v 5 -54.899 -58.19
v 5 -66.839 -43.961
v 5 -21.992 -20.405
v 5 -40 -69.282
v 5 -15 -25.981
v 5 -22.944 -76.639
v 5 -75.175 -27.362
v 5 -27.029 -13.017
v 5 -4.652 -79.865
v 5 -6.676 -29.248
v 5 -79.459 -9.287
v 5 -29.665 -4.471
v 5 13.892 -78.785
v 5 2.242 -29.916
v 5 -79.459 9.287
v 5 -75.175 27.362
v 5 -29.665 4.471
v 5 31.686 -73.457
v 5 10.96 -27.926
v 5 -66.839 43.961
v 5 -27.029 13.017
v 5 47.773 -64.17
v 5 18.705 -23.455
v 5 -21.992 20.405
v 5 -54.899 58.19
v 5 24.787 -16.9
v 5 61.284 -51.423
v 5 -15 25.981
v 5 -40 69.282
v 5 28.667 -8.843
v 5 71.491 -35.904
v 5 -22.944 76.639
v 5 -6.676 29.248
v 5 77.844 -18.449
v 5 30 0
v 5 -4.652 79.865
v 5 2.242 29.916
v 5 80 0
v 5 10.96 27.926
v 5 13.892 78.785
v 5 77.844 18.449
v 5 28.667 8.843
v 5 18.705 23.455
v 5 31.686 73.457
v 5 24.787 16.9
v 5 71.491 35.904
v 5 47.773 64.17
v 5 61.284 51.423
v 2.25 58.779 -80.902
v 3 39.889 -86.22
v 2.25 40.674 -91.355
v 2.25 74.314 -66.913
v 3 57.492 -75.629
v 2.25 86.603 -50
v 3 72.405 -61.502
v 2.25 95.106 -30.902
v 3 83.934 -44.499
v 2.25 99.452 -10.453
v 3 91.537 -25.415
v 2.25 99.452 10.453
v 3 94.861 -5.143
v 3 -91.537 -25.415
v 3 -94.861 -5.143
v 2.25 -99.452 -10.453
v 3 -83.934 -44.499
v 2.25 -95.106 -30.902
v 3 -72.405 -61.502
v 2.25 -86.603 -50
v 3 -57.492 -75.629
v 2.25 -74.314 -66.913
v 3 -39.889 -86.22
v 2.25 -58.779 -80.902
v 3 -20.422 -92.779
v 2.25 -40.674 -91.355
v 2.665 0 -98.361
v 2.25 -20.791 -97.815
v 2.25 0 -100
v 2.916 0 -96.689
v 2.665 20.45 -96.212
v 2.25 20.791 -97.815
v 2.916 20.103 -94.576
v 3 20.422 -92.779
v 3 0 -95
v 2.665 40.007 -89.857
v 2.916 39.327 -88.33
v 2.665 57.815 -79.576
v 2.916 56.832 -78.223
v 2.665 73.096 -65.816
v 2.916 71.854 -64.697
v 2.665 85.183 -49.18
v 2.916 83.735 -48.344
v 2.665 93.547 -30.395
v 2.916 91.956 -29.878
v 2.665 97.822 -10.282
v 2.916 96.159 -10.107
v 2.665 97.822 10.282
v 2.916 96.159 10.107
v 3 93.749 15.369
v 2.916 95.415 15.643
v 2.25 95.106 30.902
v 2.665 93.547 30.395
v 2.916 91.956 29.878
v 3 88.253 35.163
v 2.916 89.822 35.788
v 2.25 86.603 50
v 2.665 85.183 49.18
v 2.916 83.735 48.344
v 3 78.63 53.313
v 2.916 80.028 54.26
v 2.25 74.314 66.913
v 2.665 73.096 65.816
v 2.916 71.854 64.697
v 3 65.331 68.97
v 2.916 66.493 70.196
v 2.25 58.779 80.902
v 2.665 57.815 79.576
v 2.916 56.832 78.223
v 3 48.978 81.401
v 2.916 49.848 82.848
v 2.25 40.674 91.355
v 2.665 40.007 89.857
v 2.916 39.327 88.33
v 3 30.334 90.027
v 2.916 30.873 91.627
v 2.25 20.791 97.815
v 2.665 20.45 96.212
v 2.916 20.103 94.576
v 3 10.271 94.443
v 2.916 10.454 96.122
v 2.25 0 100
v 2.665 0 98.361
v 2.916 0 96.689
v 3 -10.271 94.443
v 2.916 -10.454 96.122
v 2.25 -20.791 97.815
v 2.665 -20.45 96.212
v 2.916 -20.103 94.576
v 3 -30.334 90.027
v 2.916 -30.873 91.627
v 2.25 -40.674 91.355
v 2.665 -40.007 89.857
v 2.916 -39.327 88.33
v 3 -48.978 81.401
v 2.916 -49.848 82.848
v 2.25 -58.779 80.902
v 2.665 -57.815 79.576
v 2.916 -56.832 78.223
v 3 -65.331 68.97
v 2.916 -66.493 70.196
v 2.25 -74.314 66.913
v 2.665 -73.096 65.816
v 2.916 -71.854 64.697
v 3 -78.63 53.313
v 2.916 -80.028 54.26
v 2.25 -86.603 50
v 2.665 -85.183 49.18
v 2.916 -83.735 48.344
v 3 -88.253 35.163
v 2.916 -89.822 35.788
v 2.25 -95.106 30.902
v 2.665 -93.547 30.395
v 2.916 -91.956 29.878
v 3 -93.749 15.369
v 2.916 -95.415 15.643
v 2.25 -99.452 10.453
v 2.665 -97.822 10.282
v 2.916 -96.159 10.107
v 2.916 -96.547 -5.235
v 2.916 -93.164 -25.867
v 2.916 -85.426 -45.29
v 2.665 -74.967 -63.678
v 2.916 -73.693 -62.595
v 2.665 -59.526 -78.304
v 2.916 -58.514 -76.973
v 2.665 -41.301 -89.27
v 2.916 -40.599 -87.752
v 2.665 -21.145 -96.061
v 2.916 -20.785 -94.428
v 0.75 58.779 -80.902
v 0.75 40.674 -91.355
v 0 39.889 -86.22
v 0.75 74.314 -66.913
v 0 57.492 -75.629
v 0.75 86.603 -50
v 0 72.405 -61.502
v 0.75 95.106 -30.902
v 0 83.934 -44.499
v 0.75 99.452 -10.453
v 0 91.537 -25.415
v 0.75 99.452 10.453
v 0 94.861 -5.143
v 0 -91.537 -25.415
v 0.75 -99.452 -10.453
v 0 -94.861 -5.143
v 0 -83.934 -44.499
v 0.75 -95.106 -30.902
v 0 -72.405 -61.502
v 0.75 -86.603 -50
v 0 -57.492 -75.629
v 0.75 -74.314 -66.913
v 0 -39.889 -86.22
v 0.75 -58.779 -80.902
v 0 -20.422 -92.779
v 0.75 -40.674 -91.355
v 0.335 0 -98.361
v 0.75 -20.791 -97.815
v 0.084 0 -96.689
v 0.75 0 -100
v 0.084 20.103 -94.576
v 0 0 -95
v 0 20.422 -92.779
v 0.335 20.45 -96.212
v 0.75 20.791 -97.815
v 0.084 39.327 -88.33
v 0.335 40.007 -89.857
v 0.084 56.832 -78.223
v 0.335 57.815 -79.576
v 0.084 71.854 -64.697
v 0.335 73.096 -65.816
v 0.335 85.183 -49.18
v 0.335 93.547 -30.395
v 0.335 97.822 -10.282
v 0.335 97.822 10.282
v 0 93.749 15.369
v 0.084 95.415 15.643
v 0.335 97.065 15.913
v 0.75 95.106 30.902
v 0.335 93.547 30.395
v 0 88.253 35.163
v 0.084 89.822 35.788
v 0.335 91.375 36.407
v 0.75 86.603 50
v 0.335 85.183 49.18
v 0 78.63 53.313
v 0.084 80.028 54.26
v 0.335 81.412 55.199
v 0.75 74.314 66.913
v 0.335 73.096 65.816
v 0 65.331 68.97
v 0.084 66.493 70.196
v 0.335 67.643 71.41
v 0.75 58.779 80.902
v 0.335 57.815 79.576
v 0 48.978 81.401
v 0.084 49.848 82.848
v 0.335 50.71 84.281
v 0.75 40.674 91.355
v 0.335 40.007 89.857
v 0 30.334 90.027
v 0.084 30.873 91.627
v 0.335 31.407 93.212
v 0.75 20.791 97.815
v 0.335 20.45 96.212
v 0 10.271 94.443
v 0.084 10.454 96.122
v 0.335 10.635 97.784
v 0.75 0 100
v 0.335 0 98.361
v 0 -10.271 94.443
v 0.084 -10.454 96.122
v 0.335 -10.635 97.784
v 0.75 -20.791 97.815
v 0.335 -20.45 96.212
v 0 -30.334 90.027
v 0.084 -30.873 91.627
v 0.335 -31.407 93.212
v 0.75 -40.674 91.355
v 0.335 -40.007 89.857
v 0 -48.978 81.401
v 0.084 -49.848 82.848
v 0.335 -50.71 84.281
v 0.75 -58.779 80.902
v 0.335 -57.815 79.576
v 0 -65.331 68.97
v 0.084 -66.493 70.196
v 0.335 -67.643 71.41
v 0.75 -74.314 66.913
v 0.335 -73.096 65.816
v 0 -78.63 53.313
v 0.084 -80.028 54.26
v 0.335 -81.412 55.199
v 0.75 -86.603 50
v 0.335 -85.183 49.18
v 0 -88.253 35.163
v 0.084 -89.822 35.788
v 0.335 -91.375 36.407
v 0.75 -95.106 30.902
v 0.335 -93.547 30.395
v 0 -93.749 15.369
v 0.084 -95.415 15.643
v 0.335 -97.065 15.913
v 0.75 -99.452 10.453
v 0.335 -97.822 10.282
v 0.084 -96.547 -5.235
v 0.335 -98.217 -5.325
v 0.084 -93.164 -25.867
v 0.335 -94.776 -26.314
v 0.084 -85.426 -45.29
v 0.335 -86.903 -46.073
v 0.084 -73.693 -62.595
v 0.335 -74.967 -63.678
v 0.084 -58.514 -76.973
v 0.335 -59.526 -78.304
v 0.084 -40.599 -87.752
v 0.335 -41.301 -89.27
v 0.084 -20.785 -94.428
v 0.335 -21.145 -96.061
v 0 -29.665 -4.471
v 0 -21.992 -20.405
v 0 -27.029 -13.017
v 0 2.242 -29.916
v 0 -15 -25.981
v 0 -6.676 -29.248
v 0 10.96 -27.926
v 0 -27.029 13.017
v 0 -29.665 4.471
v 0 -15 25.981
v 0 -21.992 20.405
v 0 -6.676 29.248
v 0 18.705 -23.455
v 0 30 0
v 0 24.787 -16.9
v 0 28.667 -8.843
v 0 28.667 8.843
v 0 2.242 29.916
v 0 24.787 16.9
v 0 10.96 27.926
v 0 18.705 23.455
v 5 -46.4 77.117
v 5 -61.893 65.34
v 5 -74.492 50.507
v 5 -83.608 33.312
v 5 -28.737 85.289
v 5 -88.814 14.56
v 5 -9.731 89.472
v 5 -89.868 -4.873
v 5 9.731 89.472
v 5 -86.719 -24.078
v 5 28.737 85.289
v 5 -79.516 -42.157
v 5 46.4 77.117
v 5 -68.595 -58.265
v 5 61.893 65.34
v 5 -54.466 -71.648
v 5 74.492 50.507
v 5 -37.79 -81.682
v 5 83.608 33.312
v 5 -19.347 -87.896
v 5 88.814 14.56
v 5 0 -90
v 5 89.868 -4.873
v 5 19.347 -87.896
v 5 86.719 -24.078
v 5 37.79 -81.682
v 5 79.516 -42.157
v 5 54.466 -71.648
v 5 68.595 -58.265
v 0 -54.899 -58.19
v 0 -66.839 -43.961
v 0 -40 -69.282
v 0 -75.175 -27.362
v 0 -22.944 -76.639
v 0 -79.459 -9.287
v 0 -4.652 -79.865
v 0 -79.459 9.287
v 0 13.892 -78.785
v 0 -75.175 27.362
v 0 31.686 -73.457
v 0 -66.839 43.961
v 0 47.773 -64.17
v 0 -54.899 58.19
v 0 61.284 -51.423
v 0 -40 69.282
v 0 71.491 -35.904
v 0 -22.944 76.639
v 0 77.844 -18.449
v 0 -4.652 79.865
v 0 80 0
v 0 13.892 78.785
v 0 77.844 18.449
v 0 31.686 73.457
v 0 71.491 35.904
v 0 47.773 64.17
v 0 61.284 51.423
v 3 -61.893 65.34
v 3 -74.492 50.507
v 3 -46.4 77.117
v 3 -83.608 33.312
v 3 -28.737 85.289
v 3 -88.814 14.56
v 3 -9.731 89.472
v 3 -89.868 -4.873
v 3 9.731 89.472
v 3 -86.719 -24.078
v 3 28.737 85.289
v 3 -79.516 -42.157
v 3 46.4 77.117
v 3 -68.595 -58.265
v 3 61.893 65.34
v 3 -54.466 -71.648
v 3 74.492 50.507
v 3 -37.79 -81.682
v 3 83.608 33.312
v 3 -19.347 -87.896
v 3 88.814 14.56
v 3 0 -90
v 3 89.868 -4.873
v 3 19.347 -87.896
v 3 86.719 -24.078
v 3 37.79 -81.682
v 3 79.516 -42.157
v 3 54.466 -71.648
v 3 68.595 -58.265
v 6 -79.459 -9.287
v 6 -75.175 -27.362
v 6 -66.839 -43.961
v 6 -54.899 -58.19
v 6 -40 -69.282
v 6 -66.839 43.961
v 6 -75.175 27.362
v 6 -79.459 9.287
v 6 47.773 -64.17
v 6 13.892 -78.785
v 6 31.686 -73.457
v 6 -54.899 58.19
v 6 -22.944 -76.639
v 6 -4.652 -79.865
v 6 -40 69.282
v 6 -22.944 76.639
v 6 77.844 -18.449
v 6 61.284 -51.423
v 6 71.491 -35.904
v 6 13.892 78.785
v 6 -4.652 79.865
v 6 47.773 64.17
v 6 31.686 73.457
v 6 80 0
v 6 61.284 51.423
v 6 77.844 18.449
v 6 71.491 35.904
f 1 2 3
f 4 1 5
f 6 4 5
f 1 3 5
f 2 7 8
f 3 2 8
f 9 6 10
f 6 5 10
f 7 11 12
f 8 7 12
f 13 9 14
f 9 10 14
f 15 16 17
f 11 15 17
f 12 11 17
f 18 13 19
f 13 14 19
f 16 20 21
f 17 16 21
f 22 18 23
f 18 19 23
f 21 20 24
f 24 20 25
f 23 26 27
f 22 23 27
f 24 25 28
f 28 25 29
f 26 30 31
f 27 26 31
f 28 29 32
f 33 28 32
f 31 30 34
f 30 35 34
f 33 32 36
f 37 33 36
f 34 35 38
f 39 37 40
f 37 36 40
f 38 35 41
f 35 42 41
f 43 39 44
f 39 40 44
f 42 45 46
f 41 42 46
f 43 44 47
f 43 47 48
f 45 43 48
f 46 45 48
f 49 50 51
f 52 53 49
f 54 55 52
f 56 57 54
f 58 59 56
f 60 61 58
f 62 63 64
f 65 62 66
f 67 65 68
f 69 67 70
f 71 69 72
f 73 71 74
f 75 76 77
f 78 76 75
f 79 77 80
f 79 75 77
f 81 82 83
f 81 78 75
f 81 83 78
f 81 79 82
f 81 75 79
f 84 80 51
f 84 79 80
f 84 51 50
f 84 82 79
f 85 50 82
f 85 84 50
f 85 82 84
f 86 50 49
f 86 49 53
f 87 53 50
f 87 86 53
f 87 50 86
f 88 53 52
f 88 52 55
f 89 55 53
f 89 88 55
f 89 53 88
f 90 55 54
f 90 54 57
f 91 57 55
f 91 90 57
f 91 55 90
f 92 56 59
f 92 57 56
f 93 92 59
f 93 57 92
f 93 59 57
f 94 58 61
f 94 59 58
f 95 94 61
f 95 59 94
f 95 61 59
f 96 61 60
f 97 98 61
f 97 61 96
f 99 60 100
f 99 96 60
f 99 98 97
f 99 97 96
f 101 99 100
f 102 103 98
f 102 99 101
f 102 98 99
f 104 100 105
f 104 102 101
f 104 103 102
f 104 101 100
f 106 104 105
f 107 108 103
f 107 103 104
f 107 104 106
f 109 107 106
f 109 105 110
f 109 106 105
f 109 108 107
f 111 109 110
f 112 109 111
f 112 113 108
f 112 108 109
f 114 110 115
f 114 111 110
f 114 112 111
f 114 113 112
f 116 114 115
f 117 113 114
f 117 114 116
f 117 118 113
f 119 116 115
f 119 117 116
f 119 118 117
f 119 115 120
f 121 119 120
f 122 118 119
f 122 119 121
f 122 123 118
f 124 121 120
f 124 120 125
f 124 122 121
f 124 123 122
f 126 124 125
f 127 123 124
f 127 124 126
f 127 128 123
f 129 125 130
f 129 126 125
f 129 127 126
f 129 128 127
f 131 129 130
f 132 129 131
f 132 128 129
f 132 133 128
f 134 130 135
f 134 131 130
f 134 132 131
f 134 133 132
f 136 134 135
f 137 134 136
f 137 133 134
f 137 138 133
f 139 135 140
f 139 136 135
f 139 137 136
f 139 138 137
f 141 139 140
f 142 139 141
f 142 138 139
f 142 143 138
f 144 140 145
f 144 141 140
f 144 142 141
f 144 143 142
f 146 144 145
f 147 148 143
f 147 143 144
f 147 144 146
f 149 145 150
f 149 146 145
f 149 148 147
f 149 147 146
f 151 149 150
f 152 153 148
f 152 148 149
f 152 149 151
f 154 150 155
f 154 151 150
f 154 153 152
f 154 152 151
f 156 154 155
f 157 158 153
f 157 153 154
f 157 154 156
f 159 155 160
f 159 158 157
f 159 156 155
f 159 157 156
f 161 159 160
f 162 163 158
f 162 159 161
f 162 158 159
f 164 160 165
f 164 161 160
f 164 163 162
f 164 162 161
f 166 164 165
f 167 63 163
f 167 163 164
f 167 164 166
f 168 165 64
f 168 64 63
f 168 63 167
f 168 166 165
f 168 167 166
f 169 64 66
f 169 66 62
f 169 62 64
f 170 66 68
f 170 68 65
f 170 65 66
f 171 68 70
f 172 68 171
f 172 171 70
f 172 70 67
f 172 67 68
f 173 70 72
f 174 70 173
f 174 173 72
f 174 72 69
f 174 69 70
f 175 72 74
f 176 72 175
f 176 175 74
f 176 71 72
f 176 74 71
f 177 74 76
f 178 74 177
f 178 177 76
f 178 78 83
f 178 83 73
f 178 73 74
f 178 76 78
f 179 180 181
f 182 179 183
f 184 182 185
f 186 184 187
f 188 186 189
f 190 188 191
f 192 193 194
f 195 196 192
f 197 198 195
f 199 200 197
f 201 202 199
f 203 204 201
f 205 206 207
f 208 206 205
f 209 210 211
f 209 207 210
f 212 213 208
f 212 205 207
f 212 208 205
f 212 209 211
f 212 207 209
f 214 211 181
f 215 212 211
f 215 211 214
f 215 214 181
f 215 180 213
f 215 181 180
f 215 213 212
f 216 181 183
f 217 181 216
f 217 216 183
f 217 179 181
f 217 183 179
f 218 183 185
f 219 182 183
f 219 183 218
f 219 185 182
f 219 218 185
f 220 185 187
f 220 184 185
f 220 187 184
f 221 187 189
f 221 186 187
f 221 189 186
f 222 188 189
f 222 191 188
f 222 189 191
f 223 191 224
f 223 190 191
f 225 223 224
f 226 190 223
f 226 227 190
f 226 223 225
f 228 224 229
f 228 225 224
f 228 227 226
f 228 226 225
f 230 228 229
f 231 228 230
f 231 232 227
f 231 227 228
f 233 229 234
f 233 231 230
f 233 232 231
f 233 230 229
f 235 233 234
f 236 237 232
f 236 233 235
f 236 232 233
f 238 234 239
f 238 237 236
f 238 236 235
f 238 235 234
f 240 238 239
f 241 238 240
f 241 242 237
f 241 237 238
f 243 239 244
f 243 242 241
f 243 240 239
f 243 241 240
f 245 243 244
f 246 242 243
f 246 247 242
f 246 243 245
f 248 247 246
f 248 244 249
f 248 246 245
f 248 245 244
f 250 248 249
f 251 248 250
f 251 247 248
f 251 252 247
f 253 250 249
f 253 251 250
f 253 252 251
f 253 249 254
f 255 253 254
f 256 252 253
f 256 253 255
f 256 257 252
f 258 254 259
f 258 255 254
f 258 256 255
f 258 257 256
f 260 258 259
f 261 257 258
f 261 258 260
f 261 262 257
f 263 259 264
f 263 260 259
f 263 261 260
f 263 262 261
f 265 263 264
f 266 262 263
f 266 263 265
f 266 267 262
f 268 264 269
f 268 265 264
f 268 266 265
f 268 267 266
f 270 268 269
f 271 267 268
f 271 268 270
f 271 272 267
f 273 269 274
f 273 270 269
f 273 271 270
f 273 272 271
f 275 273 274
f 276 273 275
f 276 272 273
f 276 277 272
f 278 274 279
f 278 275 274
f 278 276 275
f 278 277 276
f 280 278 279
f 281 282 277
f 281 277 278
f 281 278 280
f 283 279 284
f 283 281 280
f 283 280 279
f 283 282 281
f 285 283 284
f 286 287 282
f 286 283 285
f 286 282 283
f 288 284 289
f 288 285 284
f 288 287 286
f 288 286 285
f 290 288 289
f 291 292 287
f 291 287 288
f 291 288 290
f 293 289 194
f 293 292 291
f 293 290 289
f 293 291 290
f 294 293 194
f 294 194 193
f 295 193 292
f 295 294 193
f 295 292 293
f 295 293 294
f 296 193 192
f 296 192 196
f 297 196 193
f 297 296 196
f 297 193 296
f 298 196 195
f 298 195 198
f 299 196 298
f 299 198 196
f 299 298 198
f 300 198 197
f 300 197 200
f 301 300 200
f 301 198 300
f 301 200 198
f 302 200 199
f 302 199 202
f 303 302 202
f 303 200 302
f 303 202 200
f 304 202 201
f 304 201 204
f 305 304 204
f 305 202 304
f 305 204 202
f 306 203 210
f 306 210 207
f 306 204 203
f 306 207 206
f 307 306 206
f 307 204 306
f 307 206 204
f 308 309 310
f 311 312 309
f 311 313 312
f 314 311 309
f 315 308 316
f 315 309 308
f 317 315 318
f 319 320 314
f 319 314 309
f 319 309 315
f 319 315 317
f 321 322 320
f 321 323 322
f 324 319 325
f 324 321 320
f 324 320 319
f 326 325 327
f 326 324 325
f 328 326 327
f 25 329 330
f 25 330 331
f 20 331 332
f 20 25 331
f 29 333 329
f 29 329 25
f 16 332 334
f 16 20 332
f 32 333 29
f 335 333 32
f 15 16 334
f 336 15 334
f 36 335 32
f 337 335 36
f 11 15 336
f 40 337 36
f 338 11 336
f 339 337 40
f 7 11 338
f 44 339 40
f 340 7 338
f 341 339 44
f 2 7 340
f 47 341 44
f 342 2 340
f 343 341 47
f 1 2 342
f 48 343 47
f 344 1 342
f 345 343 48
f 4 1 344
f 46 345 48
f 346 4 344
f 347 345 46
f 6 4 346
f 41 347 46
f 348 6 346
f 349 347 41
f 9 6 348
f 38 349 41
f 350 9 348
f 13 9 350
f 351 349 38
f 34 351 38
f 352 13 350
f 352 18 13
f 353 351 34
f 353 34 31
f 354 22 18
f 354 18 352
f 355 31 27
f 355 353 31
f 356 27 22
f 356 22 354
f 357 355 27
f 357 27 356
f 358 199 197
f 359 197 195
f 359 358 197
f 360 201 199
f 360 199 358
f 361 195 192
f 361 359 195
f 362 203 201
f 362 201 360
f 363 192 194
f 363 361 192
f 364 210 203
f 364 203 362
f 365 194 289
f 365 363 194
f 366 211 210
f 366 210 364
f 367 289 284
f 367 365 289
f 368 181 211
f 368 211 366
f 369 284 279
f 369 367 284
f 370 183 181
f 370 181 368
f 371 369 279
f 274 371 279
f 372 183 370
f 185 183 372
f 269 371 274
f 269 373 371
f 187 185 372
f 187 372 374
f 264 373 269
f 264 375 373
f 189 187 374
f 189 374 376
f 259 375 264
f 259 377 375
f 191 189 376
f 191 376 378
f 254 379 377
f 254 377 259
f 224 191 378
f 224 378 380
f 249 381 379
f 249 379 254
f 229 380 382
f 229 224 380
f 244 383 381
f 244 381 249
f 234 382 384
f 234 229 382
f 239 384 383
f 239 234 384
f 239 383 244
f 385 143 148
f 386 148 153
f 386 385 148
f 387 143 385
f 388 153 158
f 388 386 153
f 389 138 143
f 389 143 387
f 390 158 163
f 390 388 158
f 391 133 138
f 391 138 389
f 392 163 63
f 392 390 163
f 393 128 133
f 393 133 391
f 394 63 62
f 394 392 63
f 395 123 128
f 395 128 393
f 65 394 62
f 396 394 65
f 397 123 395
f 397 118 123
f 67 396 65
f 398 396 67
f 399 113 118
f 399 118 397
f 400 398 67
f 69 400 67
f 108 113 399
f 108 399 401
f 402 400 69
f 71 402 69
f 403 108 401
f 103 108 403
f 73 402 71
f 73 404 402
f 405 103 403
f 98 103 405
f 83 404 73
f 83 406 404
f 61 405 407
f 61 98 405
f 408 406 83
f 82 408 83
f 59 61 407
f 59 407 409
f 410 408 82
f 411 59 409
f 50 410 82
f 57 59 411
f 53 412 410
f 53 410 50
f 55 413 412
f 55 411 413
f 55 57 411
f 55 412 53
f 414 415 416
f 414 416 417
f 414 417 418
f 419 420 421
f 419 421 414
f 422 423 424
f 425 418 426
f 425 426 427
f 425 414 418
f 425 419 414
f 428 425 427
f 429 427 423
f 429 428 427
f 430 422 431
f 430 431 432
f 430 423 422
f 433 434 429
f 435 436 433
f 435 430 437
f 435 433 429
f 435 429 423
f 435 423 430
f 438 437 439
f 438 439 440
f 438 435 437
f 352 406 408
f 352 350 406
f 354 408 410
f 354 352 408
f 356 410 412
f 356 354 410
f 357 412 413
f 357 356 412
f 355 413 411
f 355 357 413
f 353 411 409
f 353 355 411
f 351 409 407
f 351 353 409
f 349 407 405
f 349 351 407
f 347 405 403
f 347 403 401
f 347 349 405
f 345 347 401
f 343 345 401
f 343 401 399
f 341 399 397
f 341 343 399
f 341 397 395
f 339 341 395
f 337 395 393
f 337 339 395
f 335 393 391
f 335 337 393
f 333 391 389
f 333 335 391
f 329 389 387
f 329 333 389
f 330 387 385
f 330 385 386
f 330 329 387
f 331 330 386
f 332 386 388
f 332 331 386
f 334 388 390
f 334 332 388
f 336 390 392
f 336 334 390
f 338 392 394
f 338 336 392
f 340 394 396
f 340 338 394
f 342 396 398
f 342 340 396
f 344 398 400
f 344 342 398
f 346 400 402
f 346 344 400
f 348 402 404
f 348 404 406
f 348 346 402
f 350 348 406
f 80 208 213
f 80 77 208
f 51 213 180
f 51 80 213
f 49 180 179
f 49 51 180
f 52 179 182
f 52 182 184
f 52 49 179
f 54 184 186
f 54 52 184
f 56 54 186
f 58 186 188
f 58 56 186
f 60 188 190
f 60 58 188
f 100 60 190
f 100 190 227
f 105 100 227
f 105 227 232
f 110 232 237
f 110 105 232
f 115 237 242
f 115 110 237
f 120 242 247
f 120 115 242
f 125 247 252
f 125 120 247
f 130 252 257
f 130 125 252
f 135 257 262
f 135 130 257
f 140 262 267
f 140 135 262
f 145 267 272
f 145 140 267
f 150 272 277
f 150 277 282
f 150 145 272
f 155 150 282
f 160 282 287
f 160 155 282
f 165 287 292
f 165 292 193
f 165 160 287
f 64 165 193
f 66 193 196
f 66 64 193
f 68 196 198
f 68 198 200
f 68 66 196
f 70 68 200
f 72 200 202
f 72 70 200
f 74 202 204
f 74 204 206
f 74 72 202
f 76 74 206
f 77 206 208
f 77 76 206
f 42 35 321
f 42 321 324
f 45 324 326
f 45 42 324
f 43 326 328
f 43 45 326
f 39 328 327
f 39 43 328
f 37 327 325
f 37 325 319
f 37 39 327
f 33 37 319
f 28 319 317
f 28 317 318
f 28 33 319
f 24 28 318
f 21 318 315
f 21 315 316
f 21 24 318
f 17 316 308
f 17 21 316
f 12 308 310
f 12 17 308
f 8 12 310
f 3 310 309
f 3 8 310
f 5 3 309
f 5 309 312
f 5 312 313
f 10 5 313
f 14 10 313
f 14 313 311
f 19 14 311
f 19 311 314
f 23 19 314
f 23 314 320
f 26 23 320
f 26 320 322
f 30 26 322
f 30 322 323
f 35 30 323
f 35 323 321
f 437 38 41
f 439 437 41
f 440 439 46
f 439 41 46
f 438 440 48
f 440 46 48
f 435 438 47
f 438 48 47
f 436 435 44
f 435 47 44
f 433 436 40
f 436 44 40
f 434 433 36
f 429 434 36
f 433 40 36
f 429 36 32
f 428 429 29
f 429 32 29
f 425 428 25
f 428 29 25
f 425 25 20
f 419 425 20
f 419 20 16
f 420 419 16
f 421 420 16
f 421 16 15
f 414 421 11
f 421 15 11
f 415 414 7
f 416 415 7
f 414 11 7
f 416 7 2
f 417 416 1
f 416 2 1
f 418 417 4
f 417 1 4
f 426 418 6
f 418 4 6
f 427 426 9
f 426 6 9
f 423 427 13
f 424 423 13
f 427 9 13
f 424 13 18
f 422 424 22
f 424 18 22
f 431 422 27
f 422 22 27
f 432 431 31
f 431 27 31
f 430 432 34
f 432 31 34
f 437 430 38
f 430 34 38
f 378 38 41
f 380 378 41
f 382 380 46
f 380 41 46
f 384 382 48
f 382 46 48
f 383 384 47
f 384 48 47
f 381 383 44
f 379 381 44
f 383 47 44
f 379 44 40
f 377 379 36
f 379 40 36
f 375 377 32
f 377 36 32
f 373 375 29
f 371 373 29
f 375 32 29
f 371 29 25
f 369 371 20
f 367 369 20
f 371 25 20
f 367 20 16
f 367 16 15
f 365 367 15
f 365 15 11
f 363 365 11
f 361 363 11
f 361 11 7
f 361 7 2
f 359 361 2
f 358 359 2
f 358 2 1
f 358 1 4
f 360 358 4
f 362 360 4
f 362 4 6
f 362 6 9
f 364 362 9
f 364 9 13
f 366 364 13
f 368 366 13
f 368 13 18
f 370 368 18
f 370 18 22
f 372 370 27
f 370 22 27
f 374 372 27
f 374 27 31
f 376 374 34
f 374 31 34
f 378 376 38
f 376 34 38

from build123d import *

# Parameters (mm, degrees)
F2_R      = 80
F2_R_2    = 30
F3_DEPTH  = 5.001
F3_FACE_R = 30
F4_DEPTH  = 1


with BuildPart() as f1:
    # F0 (on Front) → F1 (revolve)
    with BuildSketch(Plane.XZ):
        Polygon((5, 0), (0, 0), (0, -95), (3, -95), (3, -90), (5, -90), align=None)
        with BuildLine():
            Line((3, -95), (0, -95))
            ThreePointArc((0, -95), (0.1885429865, -97.527968552), (0.75, -100))
            Line((0.75, -100), (2.25, -100))
            ThreePointArc((2.25, -100), (2.8114570135, -97.527968552), (3, -95))
        make_face()
    revolve(axis=Axis((2.5, 0, 0), (1, 0, 0)))

    # F2 (on face) → F3 (cut, through all)
    with BuildSketch(Plane.YZ.offset(5)):
        Circle(F2_R)
        Circle(F2_R_2, mode=Mode.SUBTRACT)
    extrude(amount=-F3_DEPTH, mode=Mode.SUBTRACT)

    # F2 (on face) + F3_face (on face) → F4 (join)
    with BuildSketch(Plane.YZ.offset(5)):
        Circle(F2_R)
        Circle(F2_R_2, mode=Mode.SUBTRACT)
    with BuildSketch(Plane.YZ.offset(5)):
        Circle(F3_FACE_R)
    extrude(amount=F4_DEPTH)


solid = f1.part
